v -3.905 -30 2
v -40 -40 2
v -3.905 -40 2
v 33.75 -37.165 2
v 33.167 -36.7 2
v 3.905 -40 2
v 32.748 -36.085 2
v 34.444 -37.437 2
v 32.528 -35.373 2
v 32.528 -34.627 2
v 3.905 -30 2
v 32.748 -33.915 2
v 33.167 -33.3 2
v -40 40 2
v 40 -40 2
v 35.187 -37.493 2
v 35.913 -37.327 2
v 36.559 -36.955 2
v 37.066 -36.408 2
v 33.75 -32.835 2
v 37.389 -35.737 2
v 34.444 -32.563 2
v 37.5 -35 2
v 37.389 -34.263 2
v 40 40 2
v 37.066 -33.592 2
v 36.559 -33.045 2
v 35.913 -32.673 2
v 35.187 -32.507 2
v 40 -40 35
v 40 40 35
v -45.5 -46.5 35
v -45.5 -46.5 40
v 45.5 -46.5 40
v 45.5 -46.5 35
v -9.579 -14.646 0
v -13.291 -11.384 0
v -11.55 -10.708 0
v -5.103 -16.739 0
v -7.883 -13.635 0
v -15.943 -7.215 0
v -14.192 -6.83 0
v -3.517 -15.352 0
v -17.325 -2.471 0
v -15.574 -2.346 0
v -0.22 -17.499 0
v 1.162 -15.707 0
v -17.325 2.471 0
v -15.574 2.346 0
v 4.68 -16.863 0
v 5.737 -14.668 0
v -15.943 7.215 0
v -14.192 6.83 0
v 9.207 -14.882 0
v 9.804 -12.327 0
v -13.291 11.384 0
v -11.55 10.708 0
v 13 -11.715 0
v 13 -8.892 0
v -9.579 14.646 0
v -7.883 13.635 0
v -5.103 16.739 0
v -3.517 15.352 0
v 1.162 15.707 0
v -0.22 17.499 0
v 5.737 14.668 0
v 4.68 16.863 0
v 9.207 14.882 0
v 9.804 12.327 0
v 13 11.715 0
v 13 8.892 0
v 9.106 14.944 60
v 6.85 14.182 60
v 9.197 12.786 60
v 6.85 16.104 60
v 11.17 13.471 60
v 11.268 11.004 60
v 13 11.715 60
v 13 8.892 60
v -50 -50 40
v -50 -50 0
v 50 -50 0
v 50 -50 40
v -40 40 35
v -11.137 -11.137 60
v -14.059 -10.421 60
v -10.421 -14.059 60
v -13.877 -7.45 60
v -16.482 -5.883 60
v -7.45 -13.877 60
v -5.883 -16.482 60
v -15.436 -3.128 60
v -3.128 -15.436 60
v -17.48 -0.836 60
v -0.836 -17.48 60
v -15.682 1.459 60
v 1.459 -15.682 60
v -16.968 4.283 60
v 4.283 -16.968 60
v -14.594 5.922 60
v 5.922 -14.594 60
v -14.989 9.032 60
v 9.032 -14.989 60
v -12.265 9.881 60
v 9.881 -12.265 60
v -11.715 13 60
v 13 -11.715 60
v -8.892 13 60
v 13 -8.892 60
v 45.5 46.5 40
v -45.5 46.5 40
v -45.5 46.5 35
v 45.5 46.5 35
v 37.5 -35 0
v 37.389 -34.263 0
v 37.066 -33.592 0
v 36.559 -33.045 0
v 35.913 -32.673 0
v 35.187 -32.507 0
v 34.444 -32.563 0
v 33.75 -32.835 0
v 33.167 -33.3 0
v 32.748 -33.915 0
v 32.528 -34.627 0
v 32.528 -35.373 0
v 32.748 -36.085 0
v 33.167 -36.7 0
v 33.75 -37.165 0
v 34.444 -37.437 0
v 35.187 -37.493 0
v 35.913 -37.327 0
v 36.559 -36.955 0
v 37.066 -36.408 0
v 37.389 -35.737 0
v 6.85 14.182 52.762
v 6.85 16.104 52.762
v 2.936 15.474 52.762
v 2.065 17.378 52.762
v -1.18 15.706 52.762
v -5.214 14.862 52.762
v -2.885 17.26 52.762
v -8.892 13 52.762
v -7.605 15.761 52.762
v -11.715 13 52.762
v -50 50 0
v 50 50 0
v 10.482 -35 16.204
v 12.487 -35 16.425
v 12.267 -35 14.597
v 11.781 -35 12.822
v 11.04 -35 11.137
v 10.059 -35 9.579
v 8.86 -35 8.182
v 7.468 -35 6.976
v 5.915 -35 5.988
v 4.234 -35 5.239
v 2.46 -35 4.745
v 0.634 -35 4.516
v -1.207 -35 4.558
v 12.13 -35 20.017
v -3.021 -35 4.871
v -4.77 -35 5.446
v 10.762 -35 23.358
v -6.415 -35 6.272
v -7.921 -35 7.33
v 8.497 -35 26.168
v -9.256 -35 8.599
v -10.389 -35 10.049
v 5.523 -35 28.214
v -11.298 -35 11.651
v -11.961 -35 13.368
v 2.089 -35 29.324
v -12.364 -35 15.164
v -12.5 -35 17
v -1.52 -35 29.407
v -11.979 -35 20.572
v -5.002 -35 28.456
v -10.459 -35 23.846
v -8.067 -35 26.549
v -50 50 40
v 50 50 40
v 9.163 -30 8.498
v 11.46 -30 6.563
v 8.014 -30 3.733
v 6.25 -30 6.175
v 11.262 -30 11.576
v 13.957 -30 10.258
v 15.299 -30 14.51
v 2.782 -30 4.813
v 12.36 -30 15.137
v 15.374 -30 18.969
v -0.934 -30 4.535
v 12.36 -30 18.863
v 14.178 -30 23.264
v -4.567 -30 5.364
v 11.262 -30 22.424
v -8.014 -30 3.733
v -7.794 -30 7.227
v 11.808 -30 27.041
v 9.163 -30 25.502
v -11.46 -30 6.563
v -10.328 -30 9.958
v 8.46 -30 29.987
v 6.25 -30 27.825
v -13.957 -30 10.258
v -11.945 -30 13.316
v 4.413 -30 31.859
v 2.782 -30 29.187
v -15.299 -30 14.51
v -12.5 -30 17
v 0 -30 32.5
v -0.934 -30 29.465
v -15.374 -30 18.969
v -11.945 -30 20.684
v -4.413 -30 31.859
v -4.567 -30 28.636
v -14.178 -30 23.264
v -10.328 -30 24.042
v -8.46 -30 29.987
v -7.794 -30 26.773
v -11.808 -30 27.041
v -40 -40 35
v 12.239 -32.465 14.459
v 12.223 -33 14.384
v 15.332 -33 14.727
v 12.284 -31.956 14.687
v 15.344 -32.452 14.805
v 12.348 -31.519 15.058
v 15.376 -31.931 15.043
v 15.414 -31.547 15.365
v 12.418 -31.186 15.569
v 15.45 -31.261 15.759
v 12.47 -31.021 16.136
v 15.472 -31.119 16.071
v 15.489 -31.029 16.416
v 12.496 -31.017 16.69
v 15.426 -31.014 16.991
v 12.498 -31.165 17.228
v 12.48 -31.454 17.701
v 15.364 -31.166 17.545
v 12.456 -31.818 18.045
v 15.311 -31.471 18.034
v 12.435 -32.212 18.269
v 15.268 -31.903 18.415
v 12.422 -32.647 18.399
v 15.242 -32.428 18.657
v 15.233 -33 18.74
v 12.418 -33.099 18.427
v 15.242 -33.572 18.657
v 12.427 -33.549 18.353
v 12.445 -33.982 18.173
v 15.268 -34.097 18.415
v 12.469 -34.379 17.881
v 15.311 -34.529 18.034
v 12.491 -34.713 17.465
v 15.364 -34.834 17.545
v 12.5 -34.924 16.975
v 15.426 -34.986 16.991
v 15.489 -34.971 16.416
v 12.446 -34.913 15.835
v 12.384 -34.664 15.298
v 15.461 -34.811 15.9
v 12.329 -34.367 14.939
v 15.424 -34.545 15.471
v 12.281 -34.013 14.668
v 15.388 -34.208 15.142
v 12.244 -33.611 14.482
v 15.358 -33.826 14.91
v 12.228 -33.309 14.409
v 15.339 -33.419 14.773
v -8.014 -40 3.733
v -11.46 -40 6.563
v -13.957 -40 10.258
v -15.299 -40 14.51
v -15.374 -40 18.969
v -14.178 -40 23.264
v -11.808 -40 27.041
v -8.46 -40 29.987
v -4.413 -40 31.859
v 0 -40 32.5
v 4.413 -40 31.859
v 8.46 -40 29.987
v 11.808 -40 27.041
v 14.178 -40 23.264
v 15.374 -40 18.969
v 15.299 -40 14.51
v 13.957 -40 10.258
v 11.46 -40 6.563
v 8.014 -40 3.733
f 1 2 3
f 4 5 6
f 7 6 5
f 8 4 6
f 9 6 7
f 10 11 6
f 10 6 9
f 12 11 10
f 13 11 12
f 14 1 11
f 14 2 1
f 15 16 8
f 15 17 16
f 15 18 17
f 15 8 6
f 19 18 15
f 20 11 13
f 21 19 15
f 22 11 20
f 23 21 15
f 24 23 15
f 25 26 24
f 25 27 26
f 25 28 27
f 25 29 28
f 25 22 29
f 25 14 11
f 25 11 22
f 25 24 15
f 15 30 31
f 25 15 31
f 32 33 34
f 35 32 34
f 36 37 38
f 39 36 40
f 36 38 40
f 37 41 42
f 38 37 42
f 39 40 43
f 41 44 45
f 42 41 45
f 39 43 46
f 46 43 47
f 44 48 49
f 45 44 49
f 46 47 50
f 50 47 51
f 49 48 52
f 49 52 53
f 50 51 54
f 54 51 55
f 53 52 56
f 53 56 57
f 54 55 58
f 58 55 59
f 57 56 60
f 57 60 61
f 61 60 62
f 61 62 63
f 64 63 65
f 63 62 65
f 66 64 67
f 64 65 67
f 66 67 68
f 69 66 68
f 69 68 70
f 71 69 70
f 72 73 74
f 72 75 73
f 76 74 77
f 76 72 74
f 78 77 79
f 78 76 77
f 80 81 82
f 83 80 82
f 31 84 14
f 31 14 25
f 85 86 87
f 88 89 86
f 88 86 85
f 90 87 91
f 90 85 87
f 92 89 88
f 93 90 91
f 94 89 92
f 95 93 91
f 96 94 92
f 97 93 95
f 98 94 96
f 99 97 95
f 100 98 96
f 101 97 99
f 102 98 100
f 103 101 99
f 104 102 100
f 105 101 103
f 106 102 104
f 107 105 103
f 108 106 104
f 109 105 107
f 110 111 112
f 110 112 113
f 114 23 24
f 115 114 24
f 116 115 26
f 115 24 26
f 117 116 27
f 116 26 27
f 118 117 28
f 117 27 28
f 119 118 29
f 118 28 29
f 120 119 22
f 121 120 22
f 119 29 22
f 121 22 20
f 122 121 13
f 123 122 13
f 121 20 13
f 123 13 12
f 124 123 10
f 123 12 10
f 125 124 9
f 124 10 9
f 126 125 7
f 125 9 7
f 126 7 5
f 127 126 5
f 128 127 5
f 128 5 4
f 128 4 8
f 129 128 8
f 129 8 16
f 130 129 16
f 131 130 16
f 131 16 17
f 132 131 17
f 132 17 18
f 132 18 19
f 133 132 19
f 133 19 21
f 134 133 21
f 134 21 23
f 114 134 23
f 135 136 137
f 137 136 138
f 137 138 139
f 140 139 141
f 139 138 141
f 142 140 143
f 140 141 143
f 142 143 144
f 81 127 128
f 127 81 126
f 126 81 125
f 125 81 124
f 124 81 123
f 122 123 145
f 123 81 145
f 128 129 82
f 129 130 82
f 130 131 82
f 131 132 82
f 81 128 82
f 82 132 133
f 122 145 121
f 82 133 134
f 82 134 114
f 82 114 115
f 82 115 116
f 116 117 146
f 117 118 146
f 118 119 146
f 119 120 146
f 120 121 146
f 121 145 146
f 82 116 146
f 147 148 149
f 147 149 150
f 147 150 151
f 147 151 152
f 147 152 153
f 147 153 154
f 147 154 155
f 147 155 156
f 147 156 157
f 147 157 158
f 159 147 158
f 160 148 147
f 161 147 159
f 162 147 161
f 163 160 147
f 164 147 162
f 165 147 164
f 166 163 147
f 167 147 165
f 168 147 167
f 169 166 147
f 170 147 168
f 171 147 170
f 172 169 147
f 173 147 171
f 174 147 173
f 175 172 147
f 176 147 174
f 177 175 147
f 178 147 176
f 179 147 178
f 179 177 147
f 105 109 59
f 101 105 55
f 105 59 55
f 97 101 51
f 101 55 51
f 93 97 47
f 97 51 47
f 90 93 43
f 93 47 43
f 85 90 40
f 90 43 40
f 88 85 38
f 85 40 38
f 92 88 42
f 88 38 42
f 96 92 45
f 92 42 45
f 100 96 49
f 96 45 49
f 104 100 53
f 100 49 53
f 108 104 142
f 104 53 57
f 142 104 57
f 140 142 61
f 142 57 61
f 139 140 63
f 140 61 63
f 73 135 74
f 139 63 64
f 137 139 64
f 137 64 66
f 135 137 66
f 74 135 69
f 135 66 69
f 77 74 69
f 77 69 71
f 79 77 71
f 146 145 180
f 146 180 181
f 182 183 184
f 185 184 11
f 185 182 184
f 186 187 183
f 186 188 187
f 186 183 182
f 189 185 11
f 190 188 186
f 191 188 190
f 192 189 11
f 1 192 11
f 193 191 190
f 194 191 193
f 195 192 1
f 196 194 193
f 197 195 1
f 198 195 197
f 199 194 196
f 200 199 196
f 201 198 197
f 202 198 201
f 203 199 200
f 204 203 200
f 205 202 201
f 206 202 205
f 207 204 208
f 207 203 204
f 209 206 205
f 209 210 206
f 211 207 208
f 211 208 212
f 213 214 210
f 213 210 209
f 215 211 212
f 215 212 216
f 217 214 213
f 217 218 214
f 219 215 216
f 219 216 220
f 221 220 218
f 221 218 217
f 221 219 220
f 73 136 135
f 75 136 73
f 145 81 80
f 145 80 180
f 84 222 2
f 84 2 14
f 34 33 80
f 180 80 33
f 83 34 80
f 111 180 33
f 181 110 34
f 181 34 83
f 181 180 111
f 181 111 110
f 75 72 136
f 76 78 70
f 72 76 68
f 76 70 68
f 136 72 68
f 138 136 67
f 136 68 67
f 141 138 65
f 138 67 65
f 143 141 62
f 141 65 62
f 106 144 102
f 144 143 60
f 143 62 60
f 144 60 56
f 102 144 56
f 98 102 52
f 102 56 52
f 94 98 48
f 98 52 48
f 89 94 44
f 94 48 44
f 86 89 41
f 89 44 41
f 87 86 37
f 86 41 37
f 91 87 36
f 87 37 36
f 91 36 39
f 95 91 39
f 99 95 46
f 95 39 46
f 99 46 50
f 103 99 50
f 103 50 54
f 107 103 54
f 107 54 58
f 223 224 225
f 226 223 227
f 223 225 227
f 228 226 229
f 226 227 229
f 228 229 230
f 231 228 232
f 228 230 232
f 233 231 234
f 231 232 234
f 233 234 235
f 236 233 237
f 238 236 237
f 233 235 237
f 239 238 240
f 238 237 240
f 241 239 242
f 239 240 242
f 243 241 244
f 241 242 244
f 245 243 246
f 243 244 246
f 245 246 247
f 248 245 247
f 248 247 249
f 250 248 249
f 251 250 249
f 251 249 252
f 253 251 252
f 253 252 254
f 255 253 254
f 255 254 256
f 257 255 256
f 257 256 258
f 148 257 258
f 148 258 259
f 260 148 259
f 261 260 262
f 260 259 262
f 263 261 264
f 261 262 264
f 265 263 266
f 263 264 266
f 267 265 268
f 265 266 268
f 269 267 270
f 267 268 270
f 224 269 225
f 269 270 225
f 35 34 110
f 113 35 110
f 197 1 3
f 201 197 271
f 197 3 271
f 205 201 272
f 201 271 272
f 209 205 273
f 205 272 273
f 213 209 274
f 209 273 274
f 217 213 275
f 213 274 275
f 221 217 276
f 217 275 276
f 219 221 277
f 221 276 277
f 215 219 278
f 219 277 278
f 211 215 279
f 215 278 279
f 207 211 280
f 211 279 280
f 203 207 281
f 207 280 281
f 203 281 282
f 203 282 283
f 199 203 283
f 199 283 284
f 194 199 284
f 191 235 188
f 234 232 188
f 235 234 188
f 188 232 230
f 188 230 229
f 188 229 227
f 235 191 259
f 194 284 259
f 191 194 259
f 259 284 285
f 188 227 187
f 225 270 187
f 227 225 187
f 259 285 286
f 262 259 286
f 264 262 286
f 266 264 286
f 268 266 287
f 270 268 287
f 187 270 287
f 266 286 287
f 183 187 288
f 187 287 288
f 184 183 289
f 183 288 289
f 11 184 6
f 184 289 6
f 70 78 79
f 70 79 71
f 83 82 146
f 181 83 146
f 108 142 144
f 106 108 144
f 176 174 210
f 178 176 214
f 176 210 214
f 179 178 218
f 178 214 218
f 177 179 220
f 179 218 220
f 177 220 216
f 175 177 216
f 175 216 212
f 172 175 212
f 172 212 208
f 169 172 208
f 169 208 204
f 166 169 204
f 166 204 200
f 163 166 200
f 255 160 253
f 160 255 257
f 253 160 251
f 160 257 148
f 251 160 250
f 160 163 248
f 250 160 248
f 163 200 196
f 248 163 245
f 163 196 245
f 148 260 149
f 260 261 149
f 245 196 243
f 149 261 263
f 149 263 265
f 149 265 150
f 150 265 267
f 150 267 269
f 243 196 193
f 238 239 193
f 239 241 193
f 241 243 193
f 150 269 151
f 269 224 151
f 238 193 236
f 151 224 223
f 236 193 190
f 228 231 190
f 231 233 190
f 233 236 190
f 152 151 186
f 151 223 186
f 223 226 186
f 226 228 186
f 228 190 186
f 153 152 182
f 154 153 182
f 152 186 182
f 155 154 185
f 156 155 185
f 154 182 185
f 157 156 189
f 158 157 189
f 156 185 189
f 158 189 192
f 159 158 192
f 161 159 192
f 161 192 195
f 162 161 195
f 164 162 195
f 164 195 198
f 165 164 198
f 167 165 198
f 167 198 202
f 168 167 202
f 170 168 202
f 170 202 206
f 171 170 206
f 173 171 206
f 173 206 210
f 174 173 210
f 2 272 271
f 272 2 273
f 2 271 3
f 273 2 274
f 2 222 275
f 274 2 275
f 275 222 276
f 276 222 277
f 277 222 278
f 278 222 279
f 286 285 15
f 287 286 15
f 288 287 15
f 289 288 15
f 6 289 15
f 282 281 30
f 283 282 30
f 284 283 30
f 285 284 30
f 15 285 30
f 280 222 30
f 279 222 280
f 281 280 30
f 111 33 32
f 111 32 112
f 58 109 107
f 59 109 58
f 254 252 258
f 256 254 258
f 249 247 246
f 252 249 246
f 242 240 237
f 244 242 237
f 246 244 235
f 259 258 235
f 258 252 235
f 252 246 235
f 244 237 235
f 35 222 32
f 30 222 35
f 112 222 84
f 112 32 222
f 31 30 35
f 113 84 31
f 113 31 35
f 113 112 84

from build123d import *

# Parameters (mm, degrees)
SKETCH_W        = 100
SKETCH_H        = 100
PAD_DEPTH       = 40
SKETCH001_W     = 80
SKETCH001_H     = 80
POCKET_DEPTH    = 38
SKETCH002_W     = 91
SKETCH002_H     = 93
POCKET001_DEPTH = 5
SKETCH003_R     = 15.5
PAD001_DEPTH    = 10
SKETCH004_R     = 12.5
POCKET002_DEPTH = 5
SKETCH005_R     = 2
POCKET003_DEPTH = 5
SKETCH006_R     = 2.5
POCKET004_DEPTH = 5
SKETCH007_R     = 17.5
PAD002_DEPTH    = 60
SKETCH008_R     = 15.75
POCKET005_DEPTH = 60.001
SKETCH009_W     = 60
SKETCH009_H     = 25
POCKET006_DEPTH = 5
SKETCH010_W     = 18.791137
SKETCH010_H     = 7.238009
POCKET007_DEPTH = 5


with BuildPart() as body:
    # Sketch → Pad (new body)
    with BuildSketch(Plane.XY):
        Rectangle(SKETCH_W, SKETCH_H)
    extrude(amount=PAD_DEPTH)

    # Sketch001 (on Face6 of Pad) → Pocket (cut)
    with BuildSketch(Plane.XY.offset(40)):
        Rectangle(SKETCH001_W, SKETCH001_H)
    extrude(amount=-POCKET_DEPTH, mode=Mode.SUBTRACT)

    # Sketch002 (on Face5 of Pocket) → Pocket001 (cut)
    with BuildSketch(Plane.XY.offset(40)):
        Rectangle(SKETCH002_W, SKETCH002_H)
    extrude(amount=-POCKET001_DEPTH, mode=Mode.SUBTRACT)

    # Sketch003 (on Face12 of Pocket001) → Pad001 (join)
    with BuildSketch(Plane(origin=(0, -40, 0), x_dir=(-1, 0, 0), z_dir=(0, 1, 0))):
        with Locations((0, 17)):
            Circle(SKETCH003_R)
    extrude(amount=PAD001_DEPTH)

    # Sketch004 (on Face19 of Pad001) → Pocket002 (cut)
    with BuildSketch(Plane(origin=(0, -30, 0), x_dir=(-1, 0, 0), z_dir=(0, 1, 0))):
        with Locations((0, 17)):
            Circle(SKETCH004_R)
    extrude(amount=-POCKET002_DEPTH, mode=Mode.SUBTRACT)

    # Sketch005 (on DatumPlane) → Pocket003 (cut)
    with BuildSketch(Plane(origin=(16.0239037276, -33, 11.567913256), x_dir=(0.1096696952, 0, -0.993968087), z_dir=(0.993968087, 0, 0.1096696952))):
        with Locations((-5.215971, 0)):
            Circle(SKETCH005_R)
    extrude(amount=-POCKET003_DEPTH, mode=Mode.SUBTRACT)

    # Sketch006 (on Face16 of Pocket003) → Pocket004 (cut)
    with BuildSketch(Plane.XY.offset(2)):
        with Locations((35, -35)):
            Circle(SKETCH006_R)
    extrude(amount=-POCKET004_DEPTH, mode=Mode.SUBTRACT)


with BuildPart() as body001:
    # Sketch007 → Pad002 (new body)
    with BuildSketch(Plane.XY):
        Circle(SKETCH007_R)
    extrude(amount=PAD002_DEPTH)

    # Sketch008 (on Face2 of Pad002) → Pocket005 (cut, through all)
    with BuildSketch(Plane(origin=(0, 0, 0), x_dir=(1, 0, 0), z_dir=(0, 0, -1))):
        Circle(SKETCH008_R)
    extrude(amount=-POCKET005_DEPTH, mode=Mode.SUBTRACT)

    # Sketch009 (on DatumPlane) → Pocket006 (cut)
    with BuildSketch(Plane(origin=(18, 0, 30), x_dir=(0, 0, -1), z_dir=(1, 0, 0))):
        with Locations((0, -0.1393321247)):
            Rectangle(SKETCH009_W, SKETCH009_H)
    extrude(amount=-POCKET006_DEPTH, mode=Mode.SUBTRACT)

    # Sketch010 (on DatumPlane) → Pocket007 (cut)
    with BuildSketch(Plane(origin=(-4.8649371499, 18, 30), x_dir=(-1, 0, 0), z_dir=(0, 1, 0))):
        with Locations((-2.3194305, 26.3809955)):
            Rectangle(SKETCH010_W, SKETCH010_H)
    extrude(amount=-POCKET007_DEPTH, mode=Mode.SUBTRACT)


solid = Compound([body.part, body001.part])
